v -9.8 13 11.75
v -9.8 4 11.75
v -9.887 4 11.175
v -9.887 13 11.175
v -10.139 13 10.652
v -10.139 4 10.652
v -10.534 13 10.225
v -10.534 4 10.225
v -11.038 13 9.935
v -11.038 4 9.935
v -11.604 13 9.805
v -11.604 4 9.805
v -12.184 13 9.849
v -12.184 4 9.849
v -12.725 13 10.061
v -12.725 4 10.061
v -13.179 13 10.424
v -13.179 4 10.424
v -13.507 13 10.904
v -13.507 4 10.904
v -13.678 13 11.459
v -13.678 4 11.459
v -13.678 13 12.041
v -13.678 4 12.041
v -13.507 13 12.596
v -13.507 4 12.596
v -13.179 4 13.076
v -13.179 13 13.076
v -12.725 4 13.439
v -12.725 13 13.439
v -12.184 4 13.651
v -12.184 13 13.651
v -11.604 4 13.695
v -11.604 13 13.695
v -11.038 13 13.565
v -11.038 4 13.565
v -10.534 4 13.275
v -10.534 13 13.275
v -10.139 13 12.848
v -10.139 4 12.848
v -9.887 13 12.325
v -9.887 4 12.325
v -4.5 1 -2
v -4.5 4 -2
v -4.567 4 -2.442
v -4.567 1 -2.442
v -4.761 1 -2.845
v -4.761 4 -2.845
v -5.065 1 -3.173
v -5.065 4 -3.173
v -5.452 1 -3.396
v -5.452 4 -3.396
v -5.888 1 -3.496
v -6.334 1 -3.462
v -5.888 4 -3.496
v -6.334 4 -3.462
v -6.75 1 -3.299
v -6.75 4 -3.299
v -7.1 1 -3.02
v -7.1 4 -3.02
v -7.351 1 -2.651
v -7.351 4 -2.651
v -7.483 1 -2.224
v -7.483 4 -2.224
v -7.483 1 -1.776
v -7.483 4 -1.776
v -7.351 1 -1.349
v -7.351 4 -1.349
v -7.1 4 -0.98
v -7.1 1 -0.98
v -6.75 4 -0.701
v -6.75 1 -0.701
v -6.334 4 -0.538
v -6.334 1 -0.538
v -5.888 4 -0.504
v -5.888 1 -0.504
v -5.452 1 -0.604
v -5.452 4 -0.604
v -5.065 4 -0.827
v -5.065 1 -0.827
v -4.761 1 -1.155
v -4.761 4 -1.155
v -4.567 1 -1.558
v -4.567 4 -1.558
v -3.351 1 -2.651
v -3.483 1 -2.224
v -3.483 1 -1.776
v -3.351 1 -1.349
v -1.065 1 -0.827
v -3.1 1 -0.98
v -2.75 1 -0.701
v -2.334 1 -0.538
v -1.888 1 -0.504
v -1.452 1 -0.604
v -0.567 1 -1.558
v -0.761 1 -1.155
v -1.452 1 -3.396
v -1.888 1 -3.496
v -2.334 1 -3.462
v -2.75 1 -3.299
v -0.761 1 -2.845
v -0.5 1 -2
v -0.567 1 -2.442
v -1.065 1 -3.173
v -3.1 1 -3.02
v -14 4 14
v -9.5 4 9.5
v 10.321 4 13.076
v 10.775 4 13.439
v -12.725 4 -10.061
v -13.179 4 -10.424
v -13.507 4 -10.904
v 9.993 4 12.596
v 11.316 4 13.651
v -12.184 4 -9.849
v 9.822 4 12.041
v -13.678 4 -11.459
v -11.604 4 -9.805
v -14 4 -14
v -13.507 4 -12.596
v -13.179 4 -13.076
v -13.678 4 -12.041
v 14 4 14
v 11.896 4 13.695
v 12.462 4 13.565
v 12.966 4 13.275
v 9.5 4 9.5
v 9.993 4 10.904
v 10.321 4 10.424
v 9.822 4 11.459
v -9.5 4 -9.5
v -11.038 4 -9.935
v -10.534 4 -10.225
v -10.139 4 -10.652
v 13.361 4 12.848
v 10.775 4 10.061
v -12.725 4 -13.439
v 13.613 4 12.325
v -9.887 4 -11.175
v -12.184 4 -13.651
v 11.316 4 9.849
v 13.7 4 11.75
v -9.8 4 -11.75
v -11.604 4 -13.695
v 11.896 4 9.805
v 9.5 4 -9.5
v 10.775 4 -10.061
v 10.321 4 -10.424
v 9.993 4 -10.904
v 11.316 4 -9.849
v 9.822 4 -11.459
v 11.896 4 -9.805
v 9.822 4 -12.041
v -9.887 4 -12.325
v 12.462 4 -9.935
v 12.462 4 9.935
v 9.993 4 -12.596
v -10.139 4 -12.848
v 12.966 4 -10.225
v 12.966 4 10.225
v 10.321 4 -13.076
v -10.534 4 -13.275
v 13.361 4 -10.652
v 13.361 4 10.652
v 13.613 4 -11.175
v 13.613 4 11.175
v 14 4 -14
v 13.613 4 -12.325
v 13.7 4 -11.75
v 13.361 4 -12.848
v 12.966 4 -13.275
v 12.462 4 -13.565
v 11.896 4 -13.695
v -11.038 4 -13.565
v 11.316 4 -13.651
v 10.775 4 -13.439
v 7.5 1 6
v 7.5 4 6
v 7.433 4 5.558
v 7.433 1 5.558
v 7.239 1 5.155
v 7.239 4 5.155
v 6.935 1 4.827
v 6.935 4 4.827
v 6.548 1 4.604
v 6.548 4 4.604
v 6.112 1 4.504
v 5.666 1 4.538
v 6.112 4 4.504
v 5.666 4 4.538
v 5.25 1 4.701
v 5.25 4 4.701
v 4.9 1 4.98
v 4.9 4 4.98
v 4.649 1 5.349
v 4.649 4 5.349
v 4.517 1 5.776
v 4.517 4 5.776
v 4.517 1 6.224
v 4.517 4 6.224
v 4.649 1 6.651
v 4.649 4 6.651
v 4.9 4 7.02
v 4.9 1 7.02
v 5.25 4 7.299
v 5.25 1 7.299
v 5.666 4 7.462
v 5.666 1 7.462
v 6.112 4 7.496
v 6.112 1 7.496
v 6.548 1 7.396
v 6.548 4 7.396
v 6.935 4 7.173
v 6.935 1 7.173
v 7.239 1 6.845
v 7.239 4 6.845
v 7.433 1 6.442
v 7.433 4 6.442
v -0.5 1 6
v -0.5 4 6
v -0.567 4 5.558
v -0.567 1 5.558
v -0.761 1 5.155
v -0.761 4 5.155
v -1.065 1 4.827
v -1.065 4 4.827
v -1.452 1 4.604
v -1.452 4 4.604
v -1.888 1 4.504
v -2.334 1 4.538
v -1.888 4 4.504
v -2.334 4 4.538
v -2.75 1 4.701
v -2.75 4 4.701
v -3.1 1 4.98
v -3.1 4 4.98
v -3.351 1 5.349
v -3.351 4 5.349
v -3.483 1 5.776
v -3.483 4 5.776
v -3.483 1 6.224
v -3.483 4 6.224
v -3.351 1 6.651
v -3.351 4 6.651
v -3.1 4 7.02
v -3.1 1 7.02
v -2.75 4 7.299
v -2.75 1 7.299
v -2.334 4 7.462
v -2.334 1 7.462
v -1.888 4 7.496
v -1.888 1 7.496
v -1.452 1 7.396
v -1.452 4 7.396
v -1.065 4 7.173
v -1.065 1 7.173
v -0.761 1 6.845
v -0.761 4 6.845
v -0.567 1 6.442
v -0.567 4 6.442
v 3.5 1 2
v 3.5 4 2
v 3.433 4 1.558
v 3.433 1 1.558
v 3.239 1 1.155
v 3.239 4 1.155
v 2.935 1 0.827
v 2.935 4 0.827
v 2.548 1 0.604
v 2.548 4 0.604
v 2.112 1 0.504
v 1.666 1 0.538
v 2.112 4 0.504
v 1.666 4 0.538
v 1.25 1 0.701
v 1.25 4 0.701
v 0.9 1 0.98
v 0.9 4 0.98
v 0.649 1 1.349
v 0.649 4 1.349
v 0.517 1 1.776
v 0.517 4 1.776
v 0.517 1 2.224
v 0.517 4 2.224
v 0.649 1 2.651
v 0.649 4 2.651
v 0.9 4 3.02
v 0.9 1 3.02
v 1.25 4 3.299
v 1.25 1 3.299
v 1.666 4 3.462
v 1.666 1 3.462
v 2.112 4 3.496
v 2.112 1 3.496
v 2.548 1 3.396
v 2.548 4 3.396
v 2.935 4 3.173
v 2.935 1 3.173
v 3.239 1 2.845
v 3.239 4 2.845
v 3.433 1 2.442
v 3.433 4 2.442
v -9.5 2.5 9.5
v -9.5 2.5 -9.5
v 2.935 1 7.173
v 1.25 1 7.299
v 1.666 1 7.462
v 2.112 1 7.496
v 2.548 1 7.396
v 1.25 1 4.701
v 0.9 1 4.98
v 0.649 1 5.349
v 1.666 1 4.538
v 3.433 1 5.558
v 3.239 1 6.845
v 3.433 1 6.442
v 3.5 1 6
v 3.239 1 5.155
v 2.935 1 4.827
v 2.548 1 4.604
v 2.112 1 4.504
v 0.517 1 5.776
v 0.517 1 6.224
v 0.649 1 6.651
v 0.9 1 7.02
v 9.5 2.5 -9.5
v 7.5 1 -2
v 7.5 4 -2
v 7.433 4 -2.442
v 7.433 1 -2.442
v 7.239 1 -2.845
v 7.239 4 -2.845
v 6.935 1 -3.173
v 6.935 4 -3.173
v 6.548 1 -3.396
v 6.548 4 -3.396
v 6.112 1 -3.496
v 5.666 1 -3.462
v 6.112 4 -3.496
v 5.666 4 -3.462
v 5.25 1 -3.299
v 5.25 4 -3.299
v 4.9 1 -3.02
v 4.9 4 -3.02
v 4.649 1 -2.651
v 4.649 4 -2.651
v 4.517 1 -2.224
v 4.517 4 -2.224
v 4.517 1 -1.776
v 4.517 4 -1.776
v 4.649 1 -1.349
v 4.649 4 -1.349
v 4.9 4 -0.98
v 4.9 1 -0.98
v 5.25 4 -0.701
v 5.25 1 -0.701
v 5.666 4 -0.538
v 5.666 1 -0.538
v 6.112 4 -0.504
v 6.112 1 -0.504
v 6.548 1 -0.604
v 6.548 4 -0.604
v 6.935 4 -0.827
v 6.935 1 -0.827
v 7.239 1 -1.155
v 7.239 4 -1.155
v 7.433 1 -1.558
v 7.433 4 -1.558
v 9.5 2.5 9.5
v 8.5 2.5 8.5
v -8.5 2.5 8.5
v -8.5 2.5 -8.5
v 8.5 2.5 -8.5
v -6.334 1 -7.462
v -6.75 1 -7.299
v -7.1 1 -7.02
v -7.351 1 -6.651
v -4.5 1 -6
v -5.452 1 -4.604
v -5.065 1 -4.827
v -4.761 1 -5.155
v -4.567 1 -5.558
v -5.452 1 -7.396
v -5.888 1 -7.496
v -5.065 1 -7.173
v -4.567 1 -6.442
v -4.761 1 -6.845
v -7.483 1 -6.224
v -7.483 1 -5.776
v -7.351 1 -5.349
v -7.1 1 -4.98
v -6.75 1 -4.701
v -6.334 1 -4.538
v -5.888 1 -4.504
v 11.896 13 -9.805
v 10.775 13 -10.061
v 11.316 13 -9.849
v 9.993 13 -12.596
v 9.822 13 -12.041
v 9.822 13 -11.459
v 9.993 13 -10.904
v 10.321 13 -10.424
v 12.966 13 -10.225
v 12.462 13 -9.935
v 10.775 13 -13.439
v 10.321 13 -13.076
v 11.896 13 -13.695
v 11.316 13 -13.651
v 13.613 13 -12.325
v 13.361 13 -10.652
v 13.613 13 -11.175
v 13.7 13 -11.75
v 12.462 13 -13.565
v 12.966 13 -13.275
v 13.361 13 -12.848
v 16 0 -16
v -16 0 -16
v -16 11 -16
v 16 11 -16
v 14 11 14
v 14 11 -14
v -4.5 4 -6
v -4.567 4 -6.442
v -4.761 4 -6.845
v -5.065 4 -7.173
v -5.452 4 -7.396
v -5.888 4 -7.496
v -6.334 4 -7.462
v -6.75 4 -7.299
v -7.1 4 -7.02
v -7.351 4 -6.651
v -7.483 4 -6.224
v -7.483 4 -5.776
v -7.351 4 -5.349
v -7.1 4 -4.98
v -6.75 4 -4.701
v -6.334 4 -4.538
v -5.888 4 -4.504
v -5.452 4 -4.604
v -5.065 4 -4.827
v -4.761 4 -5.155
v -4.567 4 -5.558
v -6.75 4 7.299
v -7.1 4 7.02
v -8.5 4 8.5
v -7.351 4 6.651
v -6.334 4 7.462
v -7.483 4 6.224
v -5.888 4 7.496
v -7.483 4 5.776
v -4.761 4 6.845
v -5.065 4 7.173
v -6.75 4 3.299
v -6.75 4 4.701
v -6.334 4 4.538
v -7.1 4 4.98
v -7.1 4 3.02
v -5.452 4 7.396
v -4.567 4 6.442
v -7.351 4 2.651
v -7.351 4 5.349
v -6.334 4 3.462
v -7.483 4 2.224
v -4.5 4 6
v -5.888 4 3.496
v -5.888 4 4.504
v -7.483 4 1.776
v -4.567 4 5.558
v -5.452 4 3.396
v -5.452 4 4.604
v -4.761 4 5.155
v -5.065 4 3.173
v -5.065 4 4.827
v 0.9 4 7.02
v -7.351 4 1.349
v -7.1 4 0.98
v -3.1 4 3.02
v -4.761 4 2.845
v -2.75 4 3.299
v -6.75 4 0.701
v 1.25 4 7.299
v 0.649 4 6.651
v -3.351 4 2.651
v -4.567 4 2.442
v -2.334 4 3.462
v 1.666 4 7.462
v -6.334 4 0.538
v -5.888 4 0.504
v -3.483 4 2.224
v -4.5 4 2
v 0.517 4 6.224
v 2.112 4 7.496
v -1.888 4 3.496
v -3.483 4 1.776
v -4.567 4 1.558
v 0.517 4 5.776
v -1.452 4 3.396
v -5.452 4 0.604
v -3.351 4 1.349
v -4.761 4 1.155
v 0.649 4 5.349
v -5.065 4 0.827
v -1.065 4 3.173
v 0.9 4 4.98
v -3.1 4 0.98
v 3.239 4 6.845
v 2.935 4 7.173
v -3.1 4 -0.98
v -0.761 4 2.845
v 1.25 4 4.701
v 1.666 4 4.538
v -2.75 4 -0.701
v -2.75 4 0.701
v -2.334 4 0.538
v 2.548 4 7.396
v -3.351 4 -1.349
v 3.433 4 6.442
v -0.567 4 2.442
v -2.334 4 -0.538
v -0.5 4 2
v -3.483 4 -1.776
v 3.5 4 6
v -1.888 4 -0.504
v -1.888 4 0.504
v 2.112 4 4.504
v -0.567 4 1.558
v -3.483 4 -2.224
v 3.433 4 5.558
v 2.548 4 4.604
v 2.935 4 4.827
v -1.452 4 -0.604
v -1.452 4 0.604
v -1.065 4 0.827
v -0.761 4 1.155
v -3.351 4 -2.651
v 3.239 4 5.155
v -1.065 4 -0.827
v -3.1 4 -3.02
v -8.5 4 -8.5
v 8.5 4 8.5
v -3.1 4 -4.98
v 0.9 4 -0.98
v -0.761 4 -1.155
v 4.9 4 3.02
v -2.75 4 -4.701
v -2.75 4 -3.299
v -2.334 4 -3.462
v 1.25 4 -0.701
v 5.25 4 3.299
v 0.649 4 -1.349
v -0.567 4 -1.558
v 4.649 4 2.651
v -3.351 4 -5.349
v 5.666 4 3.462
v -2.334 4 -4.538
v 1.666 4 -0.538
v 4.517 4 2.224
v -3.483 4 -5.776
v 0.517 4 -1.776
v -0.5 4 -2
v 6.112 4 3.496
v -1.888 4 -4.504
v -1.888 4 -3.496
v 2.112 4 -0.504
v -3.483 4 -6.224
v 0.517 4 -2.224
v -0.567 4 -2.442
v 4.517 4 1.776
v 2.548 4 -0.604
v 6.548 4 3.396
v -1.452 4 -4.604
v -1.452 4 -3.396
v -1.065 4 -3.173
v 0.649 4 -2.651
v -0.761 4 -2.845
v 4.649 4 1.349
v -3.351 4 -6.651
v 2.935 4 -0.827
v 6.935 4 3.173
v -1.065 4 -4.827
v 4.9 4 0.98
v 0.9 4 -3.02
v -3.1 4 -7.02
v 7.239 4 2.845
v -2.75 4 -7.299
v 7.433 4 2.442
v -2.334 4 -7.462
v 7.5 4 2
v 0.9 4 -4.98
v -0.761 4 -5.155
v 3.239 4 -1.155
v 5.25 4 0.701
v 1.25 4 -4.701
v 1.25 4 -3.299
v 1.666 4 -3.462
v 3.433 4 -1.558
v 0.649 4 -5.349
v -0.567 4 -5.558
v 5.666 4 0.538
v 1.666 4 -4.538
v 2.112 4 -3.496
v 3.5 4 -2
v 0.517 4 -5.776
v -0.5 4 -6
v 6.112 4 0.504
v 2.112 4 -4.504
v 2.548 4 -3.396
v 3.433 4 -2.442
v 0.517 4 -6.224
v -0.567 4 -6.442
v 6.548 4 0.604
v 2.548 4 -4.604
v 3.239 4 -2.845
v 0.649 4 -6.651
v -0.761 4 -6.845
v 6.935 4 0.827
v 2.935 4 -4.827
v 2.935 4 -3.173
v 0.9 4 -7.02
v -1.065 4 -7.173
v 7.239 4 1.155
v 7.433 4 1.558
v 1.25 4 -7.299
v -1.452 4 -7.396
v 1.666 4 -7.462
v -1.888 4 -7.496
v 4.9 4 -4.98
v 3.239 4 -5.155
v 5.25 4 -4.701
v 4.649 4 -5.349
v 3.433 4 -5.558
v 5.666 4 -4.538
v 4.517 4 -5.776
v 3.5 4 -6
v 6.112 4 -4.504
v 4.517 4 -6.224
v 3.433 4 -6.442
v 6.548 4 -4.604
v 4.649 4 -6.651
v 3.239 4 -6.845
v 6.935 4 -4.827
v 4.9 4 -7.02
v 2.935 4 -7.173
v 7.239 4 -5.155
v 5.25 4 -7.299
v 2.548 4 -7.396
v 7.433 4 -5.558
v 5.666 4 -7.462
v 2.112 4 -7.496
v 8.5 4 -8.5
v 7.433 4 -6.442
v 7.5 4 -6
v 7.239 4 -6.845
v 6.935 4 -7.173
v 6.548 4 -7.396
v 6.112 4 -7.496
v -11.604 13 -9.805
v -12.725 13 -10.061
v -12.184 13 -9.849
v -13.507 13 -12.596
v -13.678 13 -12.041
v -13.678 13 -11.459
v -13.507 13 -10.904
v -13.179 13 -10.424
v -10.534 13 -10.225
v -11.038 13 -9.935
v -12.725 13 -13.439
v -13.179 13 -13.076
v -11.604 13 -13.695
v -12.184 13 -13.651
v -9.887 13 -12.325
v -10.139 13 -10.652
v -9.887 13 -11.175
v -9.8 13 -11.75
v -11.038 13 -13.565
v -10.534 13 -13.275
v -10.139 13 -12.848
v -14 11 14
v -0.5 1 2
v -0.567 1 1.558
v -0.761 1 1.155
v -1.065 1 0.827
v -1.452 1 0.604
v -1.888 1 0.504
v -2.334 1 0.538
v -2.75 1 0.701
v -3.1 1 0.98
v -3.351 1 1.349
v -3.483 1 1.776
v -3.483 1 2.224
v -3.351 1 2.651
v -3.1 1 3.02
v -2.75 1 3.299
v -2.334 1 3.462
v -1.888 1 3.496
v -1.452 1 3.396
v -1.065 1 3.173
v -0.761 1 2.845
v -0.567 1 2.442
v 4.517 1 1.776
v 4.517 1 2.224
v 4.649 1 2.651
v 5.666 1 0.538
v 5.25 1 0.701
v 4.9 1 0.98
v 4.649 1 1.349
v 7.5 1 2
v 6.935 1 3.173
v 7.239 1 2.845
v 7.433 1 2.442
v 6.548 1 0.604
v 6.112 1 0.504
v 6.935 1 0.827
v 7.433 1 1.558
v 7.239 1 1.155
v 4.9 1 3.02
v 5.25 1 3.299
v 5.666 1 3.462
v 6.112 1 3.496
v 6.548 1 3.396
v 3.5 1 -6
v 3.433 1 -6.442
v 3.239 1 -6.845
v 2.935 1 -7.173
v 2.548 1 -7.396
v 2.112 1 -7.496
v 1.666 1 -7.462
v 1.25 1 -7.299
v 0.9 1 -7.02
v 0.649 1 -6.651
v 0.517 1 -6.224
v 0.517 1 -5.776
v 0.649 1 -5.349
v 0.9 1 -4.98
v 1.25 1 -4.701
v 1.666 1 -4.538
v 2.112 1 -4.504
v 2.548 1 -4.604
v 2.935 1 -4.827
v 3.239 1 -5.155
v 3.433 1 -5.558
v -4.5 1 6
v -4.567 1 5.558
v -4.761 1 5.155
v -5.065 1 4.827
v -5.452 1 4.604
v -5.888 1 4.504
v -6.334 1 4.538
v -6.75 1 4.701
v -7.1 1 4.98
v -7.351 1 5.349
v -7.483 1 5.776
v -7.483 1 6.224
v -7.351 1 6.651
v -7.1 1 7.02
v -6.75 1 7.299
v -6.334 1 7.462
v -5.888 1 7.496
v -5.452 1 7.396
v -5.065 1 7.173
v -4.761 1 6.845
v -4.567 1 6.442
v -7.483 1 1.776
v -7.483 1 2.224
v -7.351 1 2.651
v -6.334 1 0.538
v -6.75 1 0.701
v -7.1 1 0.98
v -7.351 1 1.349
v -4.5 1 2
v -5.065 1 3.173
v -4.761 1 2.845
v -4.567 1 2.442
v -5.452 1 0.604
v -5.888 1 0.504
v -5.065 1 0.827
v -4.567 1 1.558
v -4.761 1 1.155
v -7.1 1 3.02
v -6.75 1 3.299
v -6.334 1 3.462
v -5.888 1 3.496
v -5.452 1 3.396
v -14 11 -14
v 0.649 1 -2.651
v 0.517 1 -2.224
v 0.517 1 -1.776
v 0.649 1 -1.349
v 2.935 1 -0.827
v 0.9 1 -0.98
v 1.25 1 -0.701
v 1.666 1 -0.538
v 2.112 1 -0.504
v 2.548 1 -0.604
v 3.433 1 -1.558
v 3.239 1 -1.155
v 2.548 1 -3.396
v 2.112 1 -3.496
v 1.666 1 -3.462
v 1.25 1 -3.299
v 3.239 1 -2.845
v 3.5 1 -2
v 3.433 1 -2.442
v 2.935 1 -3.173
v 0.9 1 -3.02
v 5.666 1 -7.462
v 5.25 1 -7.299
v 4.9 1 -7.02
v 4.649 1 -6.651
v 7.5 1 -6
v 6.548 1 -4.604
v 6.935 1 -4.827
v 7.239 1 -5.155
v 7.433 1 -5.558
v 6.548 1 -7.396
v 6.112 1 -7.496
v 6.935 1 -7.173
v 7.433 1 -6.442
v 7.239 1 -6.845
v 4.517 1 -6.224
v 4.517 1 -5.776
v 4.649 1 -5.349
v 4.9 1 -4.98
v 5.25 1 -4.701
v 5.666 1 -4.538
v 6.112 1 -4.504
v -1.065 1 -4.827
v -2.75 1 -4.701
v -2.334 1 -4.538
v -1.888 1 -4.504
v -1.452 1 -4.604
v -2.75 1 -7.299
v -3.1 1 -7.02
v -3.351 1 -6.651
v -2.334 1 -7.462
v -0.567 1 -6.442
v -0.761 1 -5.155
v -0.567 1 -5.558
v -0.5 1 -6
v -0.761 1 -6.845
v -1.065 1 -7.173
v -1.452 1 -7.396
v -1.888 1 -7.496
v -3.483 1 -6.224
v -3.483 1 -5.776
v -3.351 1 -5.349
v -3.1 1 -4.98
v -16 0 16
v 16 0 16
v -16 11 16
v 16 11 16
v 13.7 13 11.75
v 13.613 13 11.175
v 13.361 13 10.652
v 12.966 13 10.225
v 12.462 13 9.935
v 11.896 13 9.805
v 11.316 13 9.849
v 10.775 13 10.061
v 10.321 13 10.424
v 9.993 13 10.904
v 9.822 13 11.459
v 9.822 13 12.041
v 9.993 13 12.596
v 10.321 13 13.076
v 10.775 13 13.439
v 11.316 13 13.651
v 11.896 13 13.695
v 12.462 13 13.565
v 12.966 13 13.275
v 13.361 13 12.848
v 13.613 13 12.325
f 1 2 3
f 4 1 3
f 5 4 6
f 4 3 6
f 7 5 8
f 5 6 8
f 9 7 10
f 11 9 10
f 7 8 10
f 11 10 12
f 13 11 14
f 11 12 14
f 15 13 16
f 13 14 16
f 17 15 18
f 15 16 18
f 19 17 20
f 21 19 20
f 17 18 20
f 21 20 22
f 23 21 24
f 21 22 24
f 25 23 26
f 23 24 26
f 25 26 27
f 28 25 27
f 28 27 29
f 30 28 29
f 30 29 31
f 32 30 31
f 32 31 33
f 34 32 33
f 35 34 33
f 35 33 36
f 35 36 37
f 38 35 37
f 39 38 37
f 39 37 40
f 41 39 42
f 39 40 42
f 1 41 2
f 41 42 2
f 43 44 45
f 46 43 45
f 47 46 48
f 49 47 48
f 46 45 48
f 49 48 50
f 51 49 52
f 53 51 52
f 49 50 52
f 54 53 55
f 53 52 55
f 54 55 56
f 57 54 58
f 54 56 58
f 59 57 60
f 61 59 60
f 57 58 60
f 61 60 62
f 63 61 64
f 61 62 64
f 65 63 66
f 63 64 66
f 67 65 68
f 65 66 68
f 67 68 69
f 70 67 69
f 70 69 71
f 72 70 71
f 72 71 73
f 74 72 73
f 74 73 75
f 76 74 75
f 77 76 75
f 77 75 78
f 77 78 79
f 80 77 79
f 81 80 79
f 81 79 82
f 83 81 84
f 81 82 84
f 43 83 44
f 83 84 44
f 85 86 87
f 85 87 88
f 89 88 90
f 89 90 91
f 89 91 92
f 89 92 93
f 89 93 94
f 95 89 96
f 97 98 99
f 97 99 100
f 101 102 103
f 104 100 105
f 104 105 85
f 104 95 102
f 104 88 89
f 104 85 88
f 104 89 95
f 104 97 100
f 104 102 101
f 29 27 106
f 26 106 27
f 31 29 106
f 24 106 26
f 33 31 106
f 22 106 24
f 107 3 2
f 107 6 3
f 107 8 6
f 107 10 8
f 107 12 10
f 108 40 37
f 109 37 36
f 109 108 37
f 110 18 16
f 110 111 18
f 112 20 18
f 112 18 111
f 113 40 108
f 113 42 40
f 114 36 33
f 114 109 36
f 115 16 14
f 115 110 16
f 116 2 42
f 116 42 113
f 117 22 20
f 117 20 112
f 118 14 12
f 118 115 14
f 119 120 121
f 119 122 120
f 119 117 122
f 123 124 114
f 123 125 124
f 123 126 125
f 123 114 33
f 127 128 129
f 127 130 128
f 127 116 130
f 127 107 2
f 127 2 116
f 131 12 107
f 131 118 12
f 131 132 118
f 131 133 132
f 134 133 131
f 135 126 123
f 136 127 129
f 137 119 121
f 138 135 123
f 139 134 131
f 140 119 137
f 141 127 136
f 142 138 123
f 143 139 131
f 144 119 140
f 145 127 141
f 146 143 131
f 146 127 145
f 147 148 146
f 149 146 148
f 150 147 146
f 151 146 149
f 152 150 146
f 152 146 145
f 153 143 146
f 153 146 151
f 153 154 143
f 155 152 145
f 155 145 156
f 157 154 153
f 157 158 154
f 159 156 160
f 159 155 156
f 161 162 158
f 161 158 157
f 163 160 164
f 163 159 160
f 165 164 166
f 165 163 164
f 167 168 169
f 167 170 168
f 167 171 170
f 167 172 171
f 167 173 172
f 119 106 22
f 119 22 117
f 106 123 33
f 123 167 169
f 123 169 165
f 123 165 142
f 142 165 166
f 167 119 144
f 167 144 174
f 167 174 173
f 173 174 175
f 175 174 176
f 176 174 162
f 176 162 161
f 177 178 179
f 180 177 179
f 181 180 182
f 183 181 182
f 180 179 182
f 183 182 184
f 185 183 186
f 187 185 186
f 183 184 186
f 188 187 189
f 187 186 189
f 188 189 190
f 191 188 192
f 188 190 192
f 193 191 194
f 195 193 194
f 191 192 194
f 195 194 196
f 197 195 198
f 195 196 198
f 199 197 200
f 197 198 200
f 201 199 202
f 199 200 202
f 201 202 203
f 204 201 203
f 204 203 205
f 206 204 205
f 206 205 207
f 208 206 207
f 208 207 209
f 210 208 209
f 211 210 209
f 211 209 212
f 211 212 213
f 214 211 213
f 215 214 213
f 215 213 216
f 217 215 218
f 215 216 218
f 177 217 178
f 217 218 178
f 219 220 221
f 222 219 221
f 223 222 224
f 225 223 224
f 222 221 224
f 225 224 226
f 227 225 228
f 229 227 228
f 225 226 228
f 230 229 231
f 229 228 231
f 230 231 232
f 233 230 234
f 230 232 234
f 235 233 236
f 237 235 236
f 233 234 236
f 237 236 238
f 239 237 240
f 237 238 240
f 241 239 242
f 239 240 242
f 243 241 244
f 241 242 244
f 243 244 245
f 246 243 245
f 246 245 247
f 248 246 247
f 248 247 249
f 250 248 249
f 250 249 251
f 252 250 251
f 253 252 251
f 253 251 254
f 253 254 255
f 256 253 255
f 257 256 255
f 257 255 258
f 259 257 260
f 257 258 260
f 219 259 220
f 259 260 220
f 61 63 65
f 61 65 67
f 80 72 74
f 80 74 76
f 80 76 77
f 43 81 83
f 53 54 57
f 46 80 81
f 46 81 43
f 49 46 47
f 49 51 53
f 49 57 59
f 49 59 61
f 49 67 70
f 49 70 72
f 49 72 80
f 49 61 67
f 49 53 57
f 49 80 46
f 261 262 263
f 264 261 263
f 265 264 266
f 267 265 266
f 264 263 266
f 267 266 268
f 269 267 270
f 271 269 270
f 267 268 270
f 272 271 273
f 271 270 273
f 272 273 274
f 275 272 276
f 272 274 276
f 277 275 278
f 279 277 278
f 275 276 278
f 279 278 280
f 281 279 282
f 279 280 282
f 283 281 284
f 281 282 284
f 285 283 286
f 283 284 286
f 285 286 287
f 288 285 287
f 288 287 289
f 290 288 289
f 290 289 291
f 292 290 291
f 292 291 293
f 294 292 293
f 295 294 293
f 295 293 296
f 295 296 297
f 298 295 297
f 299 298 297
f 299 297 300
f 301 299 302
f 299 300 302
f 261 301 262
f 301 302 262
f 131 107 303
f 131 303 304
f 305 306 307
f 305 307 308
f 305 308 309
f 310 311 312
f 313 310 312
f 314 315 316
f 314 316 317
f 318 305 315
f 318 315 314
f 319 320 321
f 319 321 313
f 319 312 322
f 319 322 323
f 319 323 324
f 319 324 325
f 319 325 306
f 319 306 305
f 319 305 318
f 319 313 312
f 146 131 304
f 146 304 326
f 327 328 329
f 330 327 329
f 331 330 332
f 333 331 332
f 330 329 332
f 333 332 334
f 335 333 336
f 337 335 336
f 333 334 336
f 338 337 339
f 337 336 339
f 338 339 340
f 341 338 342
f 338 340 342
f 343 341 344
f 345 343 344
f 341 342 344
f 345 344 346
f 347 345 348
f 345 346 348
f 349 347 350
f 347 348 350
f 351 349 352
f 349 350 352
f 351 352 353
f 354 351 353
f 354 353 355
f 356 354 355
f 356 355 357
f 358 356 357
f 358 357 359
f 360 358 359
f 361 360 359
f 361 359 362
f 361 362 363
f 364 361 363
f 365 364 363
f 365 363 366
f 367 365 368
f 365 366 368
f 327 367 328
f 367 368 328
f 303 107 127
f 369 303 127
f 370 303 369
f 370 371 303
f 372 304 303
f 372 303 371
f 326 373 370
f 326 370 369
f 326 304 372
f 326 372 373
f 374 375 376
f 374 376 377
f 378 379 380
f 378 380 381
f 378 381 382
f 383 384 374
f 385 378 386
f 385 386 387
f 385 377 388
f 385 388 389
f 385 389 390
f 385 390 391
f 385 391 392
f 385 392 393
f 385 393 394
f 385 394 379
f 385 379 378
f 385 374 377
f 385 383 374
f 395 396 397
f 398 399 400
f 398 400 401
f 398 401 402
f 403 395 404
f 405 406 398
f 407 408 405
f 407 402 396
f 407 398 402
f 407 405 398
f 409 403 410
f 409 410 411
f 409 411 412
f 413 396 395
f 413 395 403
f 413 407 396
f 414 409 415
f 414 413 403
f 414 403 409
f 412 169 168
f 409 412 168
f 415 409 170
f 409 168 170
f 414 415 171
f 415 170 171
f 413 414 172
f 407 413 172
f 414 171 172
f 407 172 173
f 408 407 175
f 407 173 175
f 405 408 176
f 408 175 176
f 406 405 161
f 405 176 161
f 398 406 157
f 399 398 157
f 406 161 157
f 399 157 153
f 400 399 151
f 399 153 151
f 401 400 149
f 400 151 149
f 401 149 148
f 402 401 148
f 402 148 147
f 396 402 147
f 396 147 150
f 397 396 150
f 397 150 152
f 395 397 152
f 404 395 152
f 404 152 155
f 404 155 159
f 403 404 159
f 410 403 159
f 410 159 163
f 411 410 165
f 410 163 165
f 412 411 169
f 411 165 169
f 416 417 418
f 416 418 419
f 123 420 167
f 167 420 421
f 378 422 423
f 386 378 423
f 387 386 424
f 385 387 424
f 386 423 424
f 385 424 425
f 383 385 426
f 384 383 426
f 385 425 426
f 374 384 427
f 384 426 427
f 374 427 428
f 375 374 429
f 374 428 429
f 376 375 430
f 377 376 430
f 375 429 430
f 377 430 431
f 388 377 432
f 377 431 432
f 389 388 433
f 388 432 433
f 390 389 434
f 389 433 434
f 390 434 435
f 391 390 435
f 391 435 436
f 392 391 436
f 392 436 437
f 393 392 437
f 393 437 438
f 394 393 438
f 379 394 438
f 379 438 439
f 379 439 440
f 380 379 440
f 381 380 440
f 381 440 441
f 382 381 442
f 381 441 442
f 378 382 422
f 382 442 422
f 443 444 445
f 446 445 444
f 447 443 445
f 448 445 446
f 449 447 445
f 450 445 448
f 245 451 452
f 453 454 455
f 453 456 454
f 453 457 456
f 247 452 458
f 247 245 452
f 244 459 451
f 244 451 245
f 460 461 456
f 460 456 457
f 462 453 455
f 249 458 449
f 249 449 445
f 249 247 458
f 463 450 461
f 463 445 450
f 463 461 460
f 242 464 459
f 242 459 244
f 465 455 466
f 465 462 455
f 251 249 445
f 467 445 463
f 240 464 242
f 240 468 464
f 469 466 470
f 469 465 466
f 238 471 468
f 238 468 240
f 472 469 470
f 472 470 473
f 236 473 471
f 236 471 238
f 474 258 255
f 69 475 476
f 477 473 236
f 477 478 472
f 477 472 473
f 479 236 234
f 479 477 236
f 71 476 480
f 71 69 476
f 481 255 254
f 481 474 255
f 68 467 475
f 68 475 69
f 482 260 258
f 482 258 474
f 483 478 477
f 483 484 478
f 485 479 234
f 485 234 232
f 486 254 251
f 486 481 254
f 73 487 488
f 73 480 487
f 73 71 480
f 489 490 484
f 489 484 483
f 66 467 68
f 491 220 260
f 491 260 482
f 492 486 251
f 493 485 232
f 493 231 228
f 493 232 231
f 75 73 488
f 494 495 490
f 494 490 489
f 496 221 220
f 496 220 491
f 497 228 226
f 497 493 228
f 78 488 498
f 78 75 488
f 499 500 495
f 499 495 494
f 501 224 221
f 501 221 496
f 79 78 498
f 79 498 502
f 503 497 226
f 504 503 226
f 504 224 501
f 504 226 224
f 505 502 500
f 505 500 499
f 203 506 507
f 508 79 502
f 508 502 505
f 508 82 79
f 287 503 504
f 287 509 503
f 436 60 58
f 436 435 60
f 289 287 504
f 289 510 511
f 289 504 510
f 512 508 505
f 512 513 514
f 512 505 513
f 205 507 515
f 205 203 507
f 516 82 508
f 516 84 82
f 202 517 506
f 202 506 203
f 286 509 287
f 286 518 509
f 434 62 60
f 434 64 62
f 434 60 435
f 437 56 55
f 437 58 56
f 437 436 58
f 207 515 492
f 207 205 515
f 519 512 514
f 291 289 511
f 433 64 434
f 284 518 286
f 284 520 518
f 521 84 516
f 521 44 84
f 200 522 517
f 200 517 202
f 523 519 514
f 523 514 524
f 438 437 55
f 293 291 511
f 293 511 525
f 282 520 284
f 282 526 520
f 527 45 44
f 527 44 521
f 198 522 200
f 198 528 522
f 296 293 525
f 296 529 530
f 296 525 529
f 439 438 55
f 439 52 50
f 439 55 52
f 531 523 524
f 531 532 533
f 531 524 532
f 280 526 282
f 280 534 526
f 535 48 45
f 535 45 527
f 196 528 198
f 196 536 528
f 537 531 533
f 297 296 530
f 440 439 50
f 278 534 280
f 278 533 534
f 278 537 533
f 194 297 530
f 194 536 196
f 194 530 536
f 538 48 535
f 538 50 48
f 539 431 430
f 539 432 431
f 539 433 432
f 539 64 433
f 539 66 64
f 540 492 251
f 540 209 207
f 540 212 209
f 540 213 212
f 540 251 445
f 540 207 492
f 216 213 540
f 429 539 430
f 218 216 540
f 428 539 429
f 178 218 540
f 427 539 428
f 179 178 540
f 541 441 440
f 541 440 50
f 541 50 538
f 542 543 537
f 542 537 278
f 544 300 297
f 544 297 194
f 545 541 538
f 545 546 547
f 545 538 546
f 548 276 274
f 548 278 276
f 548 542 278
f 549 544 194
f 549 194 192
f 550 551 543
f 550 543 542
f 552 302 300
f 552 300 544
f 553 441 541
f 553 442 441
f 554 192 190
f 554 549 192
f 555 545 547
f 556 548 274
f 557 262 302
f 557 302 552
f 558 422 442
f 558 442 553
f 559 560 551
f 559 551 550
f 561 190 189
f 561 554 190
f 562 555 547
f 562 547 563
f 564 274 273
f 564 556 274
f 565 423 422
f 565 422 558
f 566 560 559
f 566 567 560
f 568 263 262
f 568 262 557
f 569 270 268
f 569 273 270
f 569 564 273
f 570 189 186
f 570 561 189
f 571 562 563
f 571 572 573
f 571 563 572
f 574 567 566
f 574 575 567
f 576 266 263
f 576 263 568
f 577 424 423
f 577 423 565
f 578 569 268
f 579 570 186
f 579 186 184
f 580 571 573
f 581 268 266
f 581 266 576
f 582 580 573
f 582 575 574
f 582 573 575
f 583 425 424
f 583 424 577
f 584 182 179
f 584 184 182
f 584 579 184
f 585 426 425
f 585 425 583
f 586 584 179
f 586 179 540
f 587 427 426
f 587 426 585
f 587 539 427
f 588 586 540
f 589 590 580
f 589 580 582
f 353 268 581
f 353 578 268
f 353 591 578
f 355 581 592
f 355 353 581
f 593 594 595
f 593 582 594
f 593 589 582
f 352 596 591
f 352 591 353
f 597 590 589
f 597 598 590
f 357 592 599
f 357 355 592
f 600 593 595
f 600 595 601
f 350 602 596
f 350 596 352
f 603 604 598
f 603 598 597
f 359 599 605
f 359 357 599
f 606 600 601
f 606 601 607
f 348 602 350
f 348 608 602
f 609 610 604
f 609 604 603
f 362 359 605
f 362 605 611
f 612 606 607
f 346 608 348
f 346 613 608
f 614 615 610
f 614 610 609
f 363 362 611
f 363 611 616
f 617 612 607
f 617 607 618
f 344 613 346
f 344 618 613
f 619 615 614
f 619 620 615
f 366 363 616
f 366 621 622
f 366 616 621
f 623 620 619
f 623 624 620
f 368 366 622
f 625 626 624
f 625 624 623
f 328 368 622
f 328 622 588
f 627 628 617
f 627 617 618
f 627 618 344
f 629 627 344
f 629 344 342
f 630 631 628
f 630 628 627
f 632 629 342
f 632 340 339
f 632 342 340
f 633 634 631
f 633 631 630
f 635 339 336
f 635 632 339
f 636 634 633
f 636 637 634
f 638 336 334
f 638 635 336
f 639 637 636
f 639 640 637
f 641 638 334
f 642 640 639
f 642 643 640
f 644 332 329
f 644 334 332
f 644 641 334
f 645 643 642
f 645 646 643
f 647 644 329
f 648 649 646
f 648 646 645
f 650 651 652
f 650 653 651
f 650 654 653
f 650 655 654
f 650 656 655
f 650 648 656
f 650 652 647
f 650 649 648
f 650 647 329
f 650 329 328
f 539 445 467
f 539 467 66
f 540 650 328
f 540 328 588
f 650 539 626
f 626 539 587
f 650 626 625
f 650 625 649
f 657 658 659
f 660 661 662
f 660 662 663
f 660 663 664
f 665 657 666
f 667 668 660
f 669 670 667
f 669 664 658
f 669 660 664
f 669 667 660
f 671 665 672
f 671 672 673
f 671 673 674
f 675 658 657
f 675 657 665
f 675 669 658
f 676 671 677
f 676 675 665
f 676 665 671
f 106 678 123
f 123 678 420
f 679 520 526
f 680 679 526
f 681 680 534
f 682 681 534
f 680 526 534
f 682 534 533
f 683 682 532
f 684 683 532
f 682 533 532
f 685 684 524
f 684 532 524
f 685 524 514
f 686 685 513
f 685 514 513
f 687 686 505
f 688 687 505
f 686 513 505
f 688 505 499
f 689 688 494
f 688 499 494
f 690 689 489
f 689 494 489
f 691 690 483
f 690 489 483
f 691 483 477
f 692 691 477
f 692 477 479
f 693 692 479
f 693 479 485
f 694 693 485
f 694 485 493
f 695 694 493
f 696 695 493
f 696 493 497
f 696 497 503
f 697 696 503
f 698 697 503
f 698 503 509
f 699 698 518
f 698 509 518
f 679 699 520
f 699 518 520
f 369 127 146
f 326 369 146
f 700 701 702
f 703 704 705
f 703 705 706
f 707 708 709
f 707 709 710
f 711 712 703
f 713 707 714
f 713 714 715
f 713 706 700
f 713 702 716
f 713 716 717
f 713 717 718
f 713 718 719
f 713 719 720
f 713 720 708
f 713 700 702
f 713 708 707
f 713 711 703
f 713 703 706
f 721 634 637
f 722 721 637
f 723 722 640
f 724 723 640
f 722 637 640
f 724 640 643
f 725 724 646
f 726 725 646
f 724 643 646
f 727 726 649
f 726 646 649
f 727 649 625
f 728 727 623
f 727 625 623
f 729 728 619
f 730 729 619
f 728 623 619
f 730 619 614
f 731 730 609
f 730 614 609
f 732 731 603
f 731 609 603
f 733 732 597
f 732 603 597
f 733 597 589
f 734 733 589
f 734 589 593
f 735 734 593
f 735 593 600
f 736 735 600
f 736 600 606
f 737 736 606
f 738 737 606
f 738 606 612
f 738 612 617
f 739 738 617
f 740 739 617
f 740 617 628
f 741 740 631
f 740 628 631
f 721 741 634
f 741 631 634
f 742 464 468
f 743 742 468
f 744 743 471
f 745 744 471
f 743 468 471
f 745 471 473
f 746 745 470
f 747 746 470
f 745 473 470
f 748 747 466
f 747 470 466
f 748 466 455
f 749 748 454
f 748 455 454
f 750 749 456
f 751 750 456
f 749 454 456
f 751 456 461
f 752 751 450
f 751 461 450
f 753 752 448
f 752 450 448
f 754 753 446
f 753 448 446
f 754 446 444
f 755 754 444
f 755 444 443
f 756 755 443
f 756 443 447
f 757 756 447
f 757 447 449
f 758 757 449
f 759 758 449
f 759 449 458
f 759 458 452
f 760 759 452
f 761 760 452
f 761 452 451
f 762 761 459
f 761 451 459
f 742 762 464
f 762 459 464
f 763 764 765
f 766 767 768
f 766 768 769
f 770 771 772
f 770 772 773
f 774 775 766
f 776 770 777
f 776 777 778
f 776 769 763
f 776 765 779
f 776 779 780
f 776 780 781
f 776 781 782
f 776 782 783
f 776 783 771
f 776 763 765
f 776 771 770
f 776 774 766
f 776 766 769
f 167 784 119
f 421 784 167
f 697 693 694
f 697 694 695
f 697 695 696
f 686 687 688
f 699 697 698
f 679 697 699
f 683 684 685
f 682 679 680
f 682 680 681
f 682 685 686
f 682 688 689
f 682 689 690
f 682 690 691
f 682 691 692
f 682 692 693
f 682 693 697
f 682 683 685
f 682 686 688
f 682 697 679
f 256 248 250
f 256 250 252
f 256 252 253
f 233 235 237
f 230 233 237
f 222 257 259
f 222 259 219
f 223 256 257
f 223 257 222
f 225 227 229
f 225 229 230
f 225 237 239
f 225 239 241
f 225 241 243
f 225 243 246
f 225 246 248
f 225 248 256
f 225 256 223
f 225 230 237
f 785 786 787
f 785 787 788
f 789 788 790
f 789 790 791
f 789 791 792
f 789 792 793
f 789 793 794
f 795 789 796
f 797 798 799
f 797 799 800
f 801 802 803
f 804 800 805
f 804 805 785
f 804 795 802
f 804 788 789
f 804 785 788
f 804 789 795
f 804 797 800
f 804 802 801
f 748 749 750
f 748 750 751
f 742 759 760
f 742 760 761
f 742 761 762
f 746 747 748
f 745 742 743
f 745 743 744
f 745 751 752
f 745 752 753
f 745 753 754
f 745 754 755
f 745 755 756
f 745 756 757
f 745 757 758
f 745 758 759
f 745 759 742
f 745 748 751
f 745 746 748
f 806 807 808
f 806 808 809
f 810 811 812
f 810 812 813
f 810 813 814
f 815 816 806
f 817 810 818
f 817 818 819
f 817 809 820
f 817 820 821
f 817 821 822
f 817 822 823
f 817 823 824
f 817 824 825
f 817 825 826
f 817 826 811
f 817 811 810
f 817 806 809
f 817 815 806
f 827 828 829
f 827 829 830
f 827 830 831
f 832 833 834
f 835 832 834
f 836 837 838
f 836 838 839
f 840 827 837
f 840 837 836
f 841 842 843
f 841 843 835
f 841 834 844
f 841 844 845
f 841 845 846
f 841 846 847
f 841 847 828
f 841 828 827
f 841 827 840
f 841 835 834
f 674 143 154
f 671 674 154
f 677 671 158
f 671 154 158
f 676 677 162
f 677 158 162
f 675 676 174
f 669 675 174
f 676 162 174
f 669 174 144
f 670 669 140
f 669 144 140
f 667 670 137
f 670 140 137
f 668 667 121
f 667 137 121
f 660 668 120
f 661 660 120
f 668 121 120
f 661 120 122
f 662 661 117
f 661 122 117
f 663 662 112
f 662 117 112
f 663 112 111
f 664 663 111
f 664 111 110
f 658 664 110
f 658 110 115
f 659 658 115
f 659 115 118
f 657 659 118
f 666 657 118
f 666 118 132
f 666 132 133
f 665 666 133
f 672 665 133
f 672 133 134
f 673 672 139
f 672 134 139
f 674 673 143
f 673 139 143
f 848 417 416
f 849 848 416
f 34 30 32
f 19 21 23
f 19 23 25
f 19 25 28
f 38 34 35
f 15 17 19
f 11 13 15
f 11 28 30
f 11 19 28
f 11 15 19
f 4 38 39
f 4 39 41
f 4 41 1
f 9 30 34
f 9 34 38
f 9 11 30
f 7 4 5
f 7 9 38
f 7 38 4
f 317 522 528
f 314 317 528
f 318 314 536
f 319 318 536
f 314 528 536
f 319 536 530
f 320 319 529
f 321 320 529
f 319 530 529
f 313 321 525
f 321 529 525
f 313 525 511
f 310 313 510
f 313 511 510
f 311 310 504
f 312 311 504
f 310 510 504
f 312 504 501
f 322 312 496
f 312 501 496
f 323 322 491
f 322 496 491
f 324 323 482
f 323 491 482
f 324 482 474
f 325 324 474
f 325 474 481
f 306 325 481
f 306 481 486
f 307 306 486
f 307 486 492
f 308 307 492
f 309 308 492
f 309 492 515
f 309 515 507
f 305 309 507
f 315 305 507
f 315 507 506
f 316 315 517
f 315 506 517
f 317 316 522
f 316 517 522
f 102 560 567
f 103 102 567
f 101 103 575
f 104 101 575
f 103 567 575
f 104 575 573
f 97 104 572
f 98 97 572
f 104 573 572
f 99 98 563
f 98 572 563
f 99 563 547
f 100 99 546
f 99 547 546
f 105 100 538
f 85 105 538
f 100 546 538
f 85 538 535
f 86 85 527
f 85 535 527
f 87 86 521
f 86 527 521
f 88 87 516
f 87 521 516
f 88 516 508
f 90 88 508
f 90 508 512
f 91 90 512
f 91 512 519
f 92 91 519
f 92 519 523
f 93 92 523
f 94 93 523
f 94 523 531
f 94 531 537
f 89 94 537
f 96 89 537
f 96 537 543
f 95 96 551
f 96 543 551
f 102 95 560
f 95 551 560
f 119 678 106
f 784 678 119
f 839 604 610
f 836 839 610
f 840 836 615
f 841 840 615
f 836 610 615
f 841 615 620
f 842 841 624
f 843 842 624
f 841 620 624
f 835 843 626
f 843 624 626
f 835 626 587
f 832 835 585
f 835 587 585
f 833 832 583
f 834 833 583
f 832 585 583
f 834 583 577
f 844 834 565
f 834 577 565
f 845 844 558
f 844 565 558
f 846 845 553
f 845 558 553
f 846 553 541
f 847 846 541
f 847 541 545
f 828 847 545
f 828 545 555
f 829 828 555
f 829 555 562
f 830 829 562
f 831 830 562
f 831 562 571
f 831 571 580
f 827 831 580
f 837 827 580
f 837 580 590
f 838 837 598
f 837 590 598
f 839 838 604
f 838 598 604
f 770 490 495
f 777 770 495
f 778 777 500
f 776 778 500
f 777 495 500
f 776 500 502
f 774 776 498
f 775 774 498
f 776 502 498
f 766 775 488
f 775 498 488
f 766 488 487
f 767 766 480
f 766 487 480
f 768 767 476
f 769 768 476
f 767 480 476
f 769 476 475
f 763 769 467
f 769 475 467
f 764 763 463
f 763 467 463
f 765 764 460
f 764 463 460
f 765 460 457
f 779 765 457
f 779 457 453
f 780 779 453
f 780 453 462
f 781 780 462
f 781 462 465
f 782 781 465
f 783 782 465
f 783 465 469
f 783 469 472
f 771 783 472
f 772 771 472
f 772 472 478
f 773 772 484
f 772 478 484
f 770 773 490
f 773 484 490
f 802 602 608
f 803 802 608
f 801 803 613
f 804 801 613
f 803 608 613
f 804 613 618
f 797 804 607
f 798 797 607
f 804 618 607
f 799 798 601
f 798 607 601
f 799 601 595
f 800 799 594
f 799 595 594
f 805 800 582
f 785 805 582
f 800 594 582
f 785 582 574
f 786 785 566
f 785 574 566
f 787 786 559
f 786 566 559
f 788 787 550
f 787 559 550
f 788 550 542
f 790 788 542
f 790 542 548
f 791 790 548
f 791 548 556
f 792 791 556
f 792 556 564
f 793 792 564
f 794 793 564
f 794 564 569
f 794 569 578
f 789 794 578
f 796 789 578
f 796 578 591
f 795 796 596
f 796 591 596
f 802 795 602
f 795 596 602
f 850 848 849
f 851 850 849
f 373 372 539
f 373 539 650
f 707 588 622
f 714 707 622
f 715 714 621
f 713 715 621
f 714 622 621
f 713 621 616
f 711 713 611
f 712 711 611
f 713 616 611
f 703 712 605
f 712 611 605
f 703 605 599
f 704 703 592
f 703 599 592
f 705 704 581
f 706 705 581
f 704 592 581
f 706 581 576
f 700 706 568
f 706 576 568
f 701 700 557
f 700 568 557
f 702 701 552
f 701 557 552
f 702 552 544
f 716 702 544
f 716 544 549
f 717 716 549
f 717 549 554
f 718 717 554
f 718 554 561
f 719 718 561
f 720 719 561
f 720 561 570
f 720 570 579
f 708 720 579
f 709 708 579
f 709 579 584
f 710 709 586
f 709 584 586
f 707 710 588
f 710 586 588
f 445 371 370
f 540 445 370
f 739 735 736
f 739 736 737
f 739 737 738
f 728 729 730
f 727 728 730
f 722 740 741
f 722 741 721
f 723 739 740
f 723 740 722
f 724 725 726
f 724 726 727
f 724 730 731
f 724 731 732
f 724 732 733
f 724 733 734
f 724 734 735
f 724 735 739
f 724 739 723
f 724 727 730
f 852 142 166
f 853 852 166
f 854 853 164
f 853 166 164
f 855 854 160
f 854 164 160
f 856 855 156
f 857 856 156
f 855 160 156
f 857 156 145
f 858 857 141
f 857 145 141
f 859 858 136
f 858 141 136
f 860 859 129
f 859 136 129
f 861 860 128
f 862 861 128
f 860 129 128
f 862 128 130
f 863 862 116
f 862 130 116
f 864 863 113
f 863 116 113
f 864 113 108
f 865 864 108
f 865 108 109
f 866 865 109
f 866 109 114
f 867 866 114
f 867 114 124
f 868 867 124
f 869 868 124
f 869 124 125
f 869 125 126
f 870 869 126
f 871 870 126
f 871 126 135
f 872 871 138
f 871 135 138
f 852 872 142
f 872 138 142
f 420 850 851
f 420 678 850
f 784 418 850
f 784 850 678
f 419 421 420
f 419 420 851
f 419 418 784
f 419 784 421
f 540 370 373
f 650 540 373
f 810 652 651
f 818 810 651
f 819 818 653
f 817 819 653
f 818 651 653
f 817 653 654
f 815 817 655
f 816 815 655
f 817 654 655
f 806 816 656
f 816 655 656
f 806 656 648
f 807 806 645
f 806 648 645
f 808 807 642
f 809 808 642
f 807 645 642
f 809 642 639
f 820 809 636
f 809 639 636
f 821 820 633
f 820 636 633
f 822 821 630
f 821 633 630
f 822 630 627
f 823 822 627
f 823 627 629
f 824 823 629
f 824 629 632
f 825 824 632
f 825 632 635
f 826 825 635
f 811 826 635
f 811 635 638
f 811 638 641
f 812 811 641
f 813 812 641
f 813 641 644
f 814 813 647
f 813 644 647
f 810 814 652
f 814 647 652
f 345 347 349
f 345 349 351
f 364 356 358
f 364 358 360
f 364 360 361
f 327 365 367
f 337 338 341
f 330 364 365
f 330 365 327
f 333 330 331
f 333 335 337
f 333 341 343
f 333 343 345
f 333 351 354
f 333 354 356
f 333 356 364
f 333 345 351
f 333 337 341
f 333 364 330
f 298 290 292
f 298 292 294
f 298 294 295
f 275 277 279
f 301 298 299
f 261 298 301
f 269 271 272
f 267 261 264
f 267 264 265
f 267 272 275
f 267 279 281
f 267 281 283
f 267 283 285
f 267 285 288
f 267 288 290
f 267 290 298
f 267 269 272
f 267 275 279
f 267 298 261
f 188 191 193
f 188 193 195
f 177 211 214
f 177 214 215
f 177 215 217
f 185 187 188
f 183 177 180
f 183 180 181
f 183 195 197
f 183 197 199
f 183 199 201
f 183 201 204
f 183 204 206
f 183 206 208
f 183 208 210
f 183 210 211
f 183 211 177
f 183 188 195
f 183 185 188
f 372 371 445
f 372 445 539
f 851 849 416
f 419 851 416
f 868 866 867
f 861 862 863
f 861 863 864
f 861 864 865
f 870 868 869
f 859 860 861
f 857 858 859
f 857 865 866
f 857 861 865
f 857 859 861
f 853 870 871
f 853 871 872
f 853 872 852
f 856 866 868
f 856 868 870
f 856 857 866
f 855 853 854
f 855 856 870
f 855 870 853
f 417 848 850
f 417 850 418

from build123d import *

# Parameters (mm, degrees)
SKETCH1_W           = 32
SKETCH1_H           = 32
BOSS_EXTRUDE1_DEPTH = 11
SKETCH2_W           = 28
SKETCH2_H           = 28
CUT_EXTRUDE1_DEPTH  = 7
SKETCH3_W           = 19
SKETCH3_H           = 19
CUT_EXTRUDE2_DEPTH  = 1.5
SKETCH4_W           = 17
SKETCH4_H           = 17
BOSS_EXTRUDE2_DEPTH = 1.5
SKETCH6_R           = 1.95
BOSS_EXTRUDE3_DEPTH = 9
SKETCH7_R           = 1.5
CUT_EXTRUDE3_DEPTH  = 3


with BuildPart() as part:
    # Sketch1 → Boss-Extrude1 (new body)
    with BuildSketch(Plane(origin=(0, 0, 0), x_dir=(1, 0, 0), z_dir=(0, 1, 0))):
        Rectangle(SKETCH1_W, SKETCH1_H)
    extrude(amount=BOSS_EXTRUDE1_DEPTH)

    # Sketch2 → Cut-Extrude1 (cut)
    with BuildSketch(Plane(origin=(0, 11, 0), x_dir=(1, 0, 0), z_dir=(0, 1, 0))):
        Rectangle(SKETCH2_W, SKETCH2_H)
    extrude(amount=-CUT_EXTRUDE1_DEPTH, mode=Mode.SUBTRACT)

    # Sketch3 → Cut-Extrude2 (cut)
    with BuildSketch(Plane(origin=(0, 4, 0), x_dir=(1, 0, 0), z_dir=(0, 1, 0))):
        Rectangle(SKETCH3_W, SKETCH3_H)
    extrude(amount=-CUT_EXTRUDE2_DEPTH, mode=Mode.SUBTRACT)

    # Sketch4 → Boss-Extrude2 (add)
    with BuildSketch(Plane(origin=(0, 2.5, 0), x_dir=(1, 0, 0), z_dir=(0, 1, 0))):
        Rectangle(SKETCH4_W, SKETCH4_H)
    extrude(amount=BOSS_EXTRUDE2_DEPTH)

    # Sketch6 → Boss-Extrude3 (add)
    with BuildSketch(Plane(origin=(0, 4, 0), x_dir=(1, 0, 0), z_dir=(0, 1, 0))):
        with Locations((-11.75, 11.75)):
            Circle(SKETCH6_R)
        with Locations((11.75, 11.75)):
            Circle(SKETCH6_R)
        with Locations((11.75, -11.75)):
            Circle(SKETCH6_R)
        with Locations((-11.75, -11.75)):
            Circle(SKETCH6_R)
    extrude(amount=BOSS_EXTRUDE3_DEPTH)

    # Sketch7 → Cut-Extrude3 (cut)
    with BuildSketch(Plane(origin=(0, 4, 0), x_dir=(1, 0, 0), z_dir=(0, 1, 0))):
        with Locations((-6, -6)):
            Circle(SKETCH7_R)
        with Locations((-2, -6)):
            Circle(SKETCH7_R)
        with Locations((2, -6)):
            Circle(SKETCH7_R)
        with Locations((6, -6)):
            Circle(SKETCH7_R)
        with Locations((-2, -2)):
            Circle(SKETCH7_R)
        with Locations((2, -2)):
            Circle(SKETCH7_R)
        with Locations((6, -2)):
            Circle(SKETCH7_R)
        with Locations((-2, 2)):
            Circle(SKETCH7_R)
        with Locations((2, 2)):
            Circle(SKETCH7_R)
        with Locations((6, 2)):
            Circle(SKETCH7_R)
        with Locations((-2, 6)):
            Circle(SKETCH7_R)
        with Locations((2, 6)):
            Circle(SKETCH7_R)
        with Locations((6, 6)):
            Circle(SKETCH7_R)
        with Locations((-6, -2)):
            Circle(SKETCH7_R)
        with Locations((-6, 2)):
            Circle(SKETCH7_R)
        with Locations((-6, 6)):
            Circle(SKETCH7_R)
    extrude(amount=-CUT_EXTRUDE3_DEPTH, mode=Mode.SUBTRACT)


solid = part.part
